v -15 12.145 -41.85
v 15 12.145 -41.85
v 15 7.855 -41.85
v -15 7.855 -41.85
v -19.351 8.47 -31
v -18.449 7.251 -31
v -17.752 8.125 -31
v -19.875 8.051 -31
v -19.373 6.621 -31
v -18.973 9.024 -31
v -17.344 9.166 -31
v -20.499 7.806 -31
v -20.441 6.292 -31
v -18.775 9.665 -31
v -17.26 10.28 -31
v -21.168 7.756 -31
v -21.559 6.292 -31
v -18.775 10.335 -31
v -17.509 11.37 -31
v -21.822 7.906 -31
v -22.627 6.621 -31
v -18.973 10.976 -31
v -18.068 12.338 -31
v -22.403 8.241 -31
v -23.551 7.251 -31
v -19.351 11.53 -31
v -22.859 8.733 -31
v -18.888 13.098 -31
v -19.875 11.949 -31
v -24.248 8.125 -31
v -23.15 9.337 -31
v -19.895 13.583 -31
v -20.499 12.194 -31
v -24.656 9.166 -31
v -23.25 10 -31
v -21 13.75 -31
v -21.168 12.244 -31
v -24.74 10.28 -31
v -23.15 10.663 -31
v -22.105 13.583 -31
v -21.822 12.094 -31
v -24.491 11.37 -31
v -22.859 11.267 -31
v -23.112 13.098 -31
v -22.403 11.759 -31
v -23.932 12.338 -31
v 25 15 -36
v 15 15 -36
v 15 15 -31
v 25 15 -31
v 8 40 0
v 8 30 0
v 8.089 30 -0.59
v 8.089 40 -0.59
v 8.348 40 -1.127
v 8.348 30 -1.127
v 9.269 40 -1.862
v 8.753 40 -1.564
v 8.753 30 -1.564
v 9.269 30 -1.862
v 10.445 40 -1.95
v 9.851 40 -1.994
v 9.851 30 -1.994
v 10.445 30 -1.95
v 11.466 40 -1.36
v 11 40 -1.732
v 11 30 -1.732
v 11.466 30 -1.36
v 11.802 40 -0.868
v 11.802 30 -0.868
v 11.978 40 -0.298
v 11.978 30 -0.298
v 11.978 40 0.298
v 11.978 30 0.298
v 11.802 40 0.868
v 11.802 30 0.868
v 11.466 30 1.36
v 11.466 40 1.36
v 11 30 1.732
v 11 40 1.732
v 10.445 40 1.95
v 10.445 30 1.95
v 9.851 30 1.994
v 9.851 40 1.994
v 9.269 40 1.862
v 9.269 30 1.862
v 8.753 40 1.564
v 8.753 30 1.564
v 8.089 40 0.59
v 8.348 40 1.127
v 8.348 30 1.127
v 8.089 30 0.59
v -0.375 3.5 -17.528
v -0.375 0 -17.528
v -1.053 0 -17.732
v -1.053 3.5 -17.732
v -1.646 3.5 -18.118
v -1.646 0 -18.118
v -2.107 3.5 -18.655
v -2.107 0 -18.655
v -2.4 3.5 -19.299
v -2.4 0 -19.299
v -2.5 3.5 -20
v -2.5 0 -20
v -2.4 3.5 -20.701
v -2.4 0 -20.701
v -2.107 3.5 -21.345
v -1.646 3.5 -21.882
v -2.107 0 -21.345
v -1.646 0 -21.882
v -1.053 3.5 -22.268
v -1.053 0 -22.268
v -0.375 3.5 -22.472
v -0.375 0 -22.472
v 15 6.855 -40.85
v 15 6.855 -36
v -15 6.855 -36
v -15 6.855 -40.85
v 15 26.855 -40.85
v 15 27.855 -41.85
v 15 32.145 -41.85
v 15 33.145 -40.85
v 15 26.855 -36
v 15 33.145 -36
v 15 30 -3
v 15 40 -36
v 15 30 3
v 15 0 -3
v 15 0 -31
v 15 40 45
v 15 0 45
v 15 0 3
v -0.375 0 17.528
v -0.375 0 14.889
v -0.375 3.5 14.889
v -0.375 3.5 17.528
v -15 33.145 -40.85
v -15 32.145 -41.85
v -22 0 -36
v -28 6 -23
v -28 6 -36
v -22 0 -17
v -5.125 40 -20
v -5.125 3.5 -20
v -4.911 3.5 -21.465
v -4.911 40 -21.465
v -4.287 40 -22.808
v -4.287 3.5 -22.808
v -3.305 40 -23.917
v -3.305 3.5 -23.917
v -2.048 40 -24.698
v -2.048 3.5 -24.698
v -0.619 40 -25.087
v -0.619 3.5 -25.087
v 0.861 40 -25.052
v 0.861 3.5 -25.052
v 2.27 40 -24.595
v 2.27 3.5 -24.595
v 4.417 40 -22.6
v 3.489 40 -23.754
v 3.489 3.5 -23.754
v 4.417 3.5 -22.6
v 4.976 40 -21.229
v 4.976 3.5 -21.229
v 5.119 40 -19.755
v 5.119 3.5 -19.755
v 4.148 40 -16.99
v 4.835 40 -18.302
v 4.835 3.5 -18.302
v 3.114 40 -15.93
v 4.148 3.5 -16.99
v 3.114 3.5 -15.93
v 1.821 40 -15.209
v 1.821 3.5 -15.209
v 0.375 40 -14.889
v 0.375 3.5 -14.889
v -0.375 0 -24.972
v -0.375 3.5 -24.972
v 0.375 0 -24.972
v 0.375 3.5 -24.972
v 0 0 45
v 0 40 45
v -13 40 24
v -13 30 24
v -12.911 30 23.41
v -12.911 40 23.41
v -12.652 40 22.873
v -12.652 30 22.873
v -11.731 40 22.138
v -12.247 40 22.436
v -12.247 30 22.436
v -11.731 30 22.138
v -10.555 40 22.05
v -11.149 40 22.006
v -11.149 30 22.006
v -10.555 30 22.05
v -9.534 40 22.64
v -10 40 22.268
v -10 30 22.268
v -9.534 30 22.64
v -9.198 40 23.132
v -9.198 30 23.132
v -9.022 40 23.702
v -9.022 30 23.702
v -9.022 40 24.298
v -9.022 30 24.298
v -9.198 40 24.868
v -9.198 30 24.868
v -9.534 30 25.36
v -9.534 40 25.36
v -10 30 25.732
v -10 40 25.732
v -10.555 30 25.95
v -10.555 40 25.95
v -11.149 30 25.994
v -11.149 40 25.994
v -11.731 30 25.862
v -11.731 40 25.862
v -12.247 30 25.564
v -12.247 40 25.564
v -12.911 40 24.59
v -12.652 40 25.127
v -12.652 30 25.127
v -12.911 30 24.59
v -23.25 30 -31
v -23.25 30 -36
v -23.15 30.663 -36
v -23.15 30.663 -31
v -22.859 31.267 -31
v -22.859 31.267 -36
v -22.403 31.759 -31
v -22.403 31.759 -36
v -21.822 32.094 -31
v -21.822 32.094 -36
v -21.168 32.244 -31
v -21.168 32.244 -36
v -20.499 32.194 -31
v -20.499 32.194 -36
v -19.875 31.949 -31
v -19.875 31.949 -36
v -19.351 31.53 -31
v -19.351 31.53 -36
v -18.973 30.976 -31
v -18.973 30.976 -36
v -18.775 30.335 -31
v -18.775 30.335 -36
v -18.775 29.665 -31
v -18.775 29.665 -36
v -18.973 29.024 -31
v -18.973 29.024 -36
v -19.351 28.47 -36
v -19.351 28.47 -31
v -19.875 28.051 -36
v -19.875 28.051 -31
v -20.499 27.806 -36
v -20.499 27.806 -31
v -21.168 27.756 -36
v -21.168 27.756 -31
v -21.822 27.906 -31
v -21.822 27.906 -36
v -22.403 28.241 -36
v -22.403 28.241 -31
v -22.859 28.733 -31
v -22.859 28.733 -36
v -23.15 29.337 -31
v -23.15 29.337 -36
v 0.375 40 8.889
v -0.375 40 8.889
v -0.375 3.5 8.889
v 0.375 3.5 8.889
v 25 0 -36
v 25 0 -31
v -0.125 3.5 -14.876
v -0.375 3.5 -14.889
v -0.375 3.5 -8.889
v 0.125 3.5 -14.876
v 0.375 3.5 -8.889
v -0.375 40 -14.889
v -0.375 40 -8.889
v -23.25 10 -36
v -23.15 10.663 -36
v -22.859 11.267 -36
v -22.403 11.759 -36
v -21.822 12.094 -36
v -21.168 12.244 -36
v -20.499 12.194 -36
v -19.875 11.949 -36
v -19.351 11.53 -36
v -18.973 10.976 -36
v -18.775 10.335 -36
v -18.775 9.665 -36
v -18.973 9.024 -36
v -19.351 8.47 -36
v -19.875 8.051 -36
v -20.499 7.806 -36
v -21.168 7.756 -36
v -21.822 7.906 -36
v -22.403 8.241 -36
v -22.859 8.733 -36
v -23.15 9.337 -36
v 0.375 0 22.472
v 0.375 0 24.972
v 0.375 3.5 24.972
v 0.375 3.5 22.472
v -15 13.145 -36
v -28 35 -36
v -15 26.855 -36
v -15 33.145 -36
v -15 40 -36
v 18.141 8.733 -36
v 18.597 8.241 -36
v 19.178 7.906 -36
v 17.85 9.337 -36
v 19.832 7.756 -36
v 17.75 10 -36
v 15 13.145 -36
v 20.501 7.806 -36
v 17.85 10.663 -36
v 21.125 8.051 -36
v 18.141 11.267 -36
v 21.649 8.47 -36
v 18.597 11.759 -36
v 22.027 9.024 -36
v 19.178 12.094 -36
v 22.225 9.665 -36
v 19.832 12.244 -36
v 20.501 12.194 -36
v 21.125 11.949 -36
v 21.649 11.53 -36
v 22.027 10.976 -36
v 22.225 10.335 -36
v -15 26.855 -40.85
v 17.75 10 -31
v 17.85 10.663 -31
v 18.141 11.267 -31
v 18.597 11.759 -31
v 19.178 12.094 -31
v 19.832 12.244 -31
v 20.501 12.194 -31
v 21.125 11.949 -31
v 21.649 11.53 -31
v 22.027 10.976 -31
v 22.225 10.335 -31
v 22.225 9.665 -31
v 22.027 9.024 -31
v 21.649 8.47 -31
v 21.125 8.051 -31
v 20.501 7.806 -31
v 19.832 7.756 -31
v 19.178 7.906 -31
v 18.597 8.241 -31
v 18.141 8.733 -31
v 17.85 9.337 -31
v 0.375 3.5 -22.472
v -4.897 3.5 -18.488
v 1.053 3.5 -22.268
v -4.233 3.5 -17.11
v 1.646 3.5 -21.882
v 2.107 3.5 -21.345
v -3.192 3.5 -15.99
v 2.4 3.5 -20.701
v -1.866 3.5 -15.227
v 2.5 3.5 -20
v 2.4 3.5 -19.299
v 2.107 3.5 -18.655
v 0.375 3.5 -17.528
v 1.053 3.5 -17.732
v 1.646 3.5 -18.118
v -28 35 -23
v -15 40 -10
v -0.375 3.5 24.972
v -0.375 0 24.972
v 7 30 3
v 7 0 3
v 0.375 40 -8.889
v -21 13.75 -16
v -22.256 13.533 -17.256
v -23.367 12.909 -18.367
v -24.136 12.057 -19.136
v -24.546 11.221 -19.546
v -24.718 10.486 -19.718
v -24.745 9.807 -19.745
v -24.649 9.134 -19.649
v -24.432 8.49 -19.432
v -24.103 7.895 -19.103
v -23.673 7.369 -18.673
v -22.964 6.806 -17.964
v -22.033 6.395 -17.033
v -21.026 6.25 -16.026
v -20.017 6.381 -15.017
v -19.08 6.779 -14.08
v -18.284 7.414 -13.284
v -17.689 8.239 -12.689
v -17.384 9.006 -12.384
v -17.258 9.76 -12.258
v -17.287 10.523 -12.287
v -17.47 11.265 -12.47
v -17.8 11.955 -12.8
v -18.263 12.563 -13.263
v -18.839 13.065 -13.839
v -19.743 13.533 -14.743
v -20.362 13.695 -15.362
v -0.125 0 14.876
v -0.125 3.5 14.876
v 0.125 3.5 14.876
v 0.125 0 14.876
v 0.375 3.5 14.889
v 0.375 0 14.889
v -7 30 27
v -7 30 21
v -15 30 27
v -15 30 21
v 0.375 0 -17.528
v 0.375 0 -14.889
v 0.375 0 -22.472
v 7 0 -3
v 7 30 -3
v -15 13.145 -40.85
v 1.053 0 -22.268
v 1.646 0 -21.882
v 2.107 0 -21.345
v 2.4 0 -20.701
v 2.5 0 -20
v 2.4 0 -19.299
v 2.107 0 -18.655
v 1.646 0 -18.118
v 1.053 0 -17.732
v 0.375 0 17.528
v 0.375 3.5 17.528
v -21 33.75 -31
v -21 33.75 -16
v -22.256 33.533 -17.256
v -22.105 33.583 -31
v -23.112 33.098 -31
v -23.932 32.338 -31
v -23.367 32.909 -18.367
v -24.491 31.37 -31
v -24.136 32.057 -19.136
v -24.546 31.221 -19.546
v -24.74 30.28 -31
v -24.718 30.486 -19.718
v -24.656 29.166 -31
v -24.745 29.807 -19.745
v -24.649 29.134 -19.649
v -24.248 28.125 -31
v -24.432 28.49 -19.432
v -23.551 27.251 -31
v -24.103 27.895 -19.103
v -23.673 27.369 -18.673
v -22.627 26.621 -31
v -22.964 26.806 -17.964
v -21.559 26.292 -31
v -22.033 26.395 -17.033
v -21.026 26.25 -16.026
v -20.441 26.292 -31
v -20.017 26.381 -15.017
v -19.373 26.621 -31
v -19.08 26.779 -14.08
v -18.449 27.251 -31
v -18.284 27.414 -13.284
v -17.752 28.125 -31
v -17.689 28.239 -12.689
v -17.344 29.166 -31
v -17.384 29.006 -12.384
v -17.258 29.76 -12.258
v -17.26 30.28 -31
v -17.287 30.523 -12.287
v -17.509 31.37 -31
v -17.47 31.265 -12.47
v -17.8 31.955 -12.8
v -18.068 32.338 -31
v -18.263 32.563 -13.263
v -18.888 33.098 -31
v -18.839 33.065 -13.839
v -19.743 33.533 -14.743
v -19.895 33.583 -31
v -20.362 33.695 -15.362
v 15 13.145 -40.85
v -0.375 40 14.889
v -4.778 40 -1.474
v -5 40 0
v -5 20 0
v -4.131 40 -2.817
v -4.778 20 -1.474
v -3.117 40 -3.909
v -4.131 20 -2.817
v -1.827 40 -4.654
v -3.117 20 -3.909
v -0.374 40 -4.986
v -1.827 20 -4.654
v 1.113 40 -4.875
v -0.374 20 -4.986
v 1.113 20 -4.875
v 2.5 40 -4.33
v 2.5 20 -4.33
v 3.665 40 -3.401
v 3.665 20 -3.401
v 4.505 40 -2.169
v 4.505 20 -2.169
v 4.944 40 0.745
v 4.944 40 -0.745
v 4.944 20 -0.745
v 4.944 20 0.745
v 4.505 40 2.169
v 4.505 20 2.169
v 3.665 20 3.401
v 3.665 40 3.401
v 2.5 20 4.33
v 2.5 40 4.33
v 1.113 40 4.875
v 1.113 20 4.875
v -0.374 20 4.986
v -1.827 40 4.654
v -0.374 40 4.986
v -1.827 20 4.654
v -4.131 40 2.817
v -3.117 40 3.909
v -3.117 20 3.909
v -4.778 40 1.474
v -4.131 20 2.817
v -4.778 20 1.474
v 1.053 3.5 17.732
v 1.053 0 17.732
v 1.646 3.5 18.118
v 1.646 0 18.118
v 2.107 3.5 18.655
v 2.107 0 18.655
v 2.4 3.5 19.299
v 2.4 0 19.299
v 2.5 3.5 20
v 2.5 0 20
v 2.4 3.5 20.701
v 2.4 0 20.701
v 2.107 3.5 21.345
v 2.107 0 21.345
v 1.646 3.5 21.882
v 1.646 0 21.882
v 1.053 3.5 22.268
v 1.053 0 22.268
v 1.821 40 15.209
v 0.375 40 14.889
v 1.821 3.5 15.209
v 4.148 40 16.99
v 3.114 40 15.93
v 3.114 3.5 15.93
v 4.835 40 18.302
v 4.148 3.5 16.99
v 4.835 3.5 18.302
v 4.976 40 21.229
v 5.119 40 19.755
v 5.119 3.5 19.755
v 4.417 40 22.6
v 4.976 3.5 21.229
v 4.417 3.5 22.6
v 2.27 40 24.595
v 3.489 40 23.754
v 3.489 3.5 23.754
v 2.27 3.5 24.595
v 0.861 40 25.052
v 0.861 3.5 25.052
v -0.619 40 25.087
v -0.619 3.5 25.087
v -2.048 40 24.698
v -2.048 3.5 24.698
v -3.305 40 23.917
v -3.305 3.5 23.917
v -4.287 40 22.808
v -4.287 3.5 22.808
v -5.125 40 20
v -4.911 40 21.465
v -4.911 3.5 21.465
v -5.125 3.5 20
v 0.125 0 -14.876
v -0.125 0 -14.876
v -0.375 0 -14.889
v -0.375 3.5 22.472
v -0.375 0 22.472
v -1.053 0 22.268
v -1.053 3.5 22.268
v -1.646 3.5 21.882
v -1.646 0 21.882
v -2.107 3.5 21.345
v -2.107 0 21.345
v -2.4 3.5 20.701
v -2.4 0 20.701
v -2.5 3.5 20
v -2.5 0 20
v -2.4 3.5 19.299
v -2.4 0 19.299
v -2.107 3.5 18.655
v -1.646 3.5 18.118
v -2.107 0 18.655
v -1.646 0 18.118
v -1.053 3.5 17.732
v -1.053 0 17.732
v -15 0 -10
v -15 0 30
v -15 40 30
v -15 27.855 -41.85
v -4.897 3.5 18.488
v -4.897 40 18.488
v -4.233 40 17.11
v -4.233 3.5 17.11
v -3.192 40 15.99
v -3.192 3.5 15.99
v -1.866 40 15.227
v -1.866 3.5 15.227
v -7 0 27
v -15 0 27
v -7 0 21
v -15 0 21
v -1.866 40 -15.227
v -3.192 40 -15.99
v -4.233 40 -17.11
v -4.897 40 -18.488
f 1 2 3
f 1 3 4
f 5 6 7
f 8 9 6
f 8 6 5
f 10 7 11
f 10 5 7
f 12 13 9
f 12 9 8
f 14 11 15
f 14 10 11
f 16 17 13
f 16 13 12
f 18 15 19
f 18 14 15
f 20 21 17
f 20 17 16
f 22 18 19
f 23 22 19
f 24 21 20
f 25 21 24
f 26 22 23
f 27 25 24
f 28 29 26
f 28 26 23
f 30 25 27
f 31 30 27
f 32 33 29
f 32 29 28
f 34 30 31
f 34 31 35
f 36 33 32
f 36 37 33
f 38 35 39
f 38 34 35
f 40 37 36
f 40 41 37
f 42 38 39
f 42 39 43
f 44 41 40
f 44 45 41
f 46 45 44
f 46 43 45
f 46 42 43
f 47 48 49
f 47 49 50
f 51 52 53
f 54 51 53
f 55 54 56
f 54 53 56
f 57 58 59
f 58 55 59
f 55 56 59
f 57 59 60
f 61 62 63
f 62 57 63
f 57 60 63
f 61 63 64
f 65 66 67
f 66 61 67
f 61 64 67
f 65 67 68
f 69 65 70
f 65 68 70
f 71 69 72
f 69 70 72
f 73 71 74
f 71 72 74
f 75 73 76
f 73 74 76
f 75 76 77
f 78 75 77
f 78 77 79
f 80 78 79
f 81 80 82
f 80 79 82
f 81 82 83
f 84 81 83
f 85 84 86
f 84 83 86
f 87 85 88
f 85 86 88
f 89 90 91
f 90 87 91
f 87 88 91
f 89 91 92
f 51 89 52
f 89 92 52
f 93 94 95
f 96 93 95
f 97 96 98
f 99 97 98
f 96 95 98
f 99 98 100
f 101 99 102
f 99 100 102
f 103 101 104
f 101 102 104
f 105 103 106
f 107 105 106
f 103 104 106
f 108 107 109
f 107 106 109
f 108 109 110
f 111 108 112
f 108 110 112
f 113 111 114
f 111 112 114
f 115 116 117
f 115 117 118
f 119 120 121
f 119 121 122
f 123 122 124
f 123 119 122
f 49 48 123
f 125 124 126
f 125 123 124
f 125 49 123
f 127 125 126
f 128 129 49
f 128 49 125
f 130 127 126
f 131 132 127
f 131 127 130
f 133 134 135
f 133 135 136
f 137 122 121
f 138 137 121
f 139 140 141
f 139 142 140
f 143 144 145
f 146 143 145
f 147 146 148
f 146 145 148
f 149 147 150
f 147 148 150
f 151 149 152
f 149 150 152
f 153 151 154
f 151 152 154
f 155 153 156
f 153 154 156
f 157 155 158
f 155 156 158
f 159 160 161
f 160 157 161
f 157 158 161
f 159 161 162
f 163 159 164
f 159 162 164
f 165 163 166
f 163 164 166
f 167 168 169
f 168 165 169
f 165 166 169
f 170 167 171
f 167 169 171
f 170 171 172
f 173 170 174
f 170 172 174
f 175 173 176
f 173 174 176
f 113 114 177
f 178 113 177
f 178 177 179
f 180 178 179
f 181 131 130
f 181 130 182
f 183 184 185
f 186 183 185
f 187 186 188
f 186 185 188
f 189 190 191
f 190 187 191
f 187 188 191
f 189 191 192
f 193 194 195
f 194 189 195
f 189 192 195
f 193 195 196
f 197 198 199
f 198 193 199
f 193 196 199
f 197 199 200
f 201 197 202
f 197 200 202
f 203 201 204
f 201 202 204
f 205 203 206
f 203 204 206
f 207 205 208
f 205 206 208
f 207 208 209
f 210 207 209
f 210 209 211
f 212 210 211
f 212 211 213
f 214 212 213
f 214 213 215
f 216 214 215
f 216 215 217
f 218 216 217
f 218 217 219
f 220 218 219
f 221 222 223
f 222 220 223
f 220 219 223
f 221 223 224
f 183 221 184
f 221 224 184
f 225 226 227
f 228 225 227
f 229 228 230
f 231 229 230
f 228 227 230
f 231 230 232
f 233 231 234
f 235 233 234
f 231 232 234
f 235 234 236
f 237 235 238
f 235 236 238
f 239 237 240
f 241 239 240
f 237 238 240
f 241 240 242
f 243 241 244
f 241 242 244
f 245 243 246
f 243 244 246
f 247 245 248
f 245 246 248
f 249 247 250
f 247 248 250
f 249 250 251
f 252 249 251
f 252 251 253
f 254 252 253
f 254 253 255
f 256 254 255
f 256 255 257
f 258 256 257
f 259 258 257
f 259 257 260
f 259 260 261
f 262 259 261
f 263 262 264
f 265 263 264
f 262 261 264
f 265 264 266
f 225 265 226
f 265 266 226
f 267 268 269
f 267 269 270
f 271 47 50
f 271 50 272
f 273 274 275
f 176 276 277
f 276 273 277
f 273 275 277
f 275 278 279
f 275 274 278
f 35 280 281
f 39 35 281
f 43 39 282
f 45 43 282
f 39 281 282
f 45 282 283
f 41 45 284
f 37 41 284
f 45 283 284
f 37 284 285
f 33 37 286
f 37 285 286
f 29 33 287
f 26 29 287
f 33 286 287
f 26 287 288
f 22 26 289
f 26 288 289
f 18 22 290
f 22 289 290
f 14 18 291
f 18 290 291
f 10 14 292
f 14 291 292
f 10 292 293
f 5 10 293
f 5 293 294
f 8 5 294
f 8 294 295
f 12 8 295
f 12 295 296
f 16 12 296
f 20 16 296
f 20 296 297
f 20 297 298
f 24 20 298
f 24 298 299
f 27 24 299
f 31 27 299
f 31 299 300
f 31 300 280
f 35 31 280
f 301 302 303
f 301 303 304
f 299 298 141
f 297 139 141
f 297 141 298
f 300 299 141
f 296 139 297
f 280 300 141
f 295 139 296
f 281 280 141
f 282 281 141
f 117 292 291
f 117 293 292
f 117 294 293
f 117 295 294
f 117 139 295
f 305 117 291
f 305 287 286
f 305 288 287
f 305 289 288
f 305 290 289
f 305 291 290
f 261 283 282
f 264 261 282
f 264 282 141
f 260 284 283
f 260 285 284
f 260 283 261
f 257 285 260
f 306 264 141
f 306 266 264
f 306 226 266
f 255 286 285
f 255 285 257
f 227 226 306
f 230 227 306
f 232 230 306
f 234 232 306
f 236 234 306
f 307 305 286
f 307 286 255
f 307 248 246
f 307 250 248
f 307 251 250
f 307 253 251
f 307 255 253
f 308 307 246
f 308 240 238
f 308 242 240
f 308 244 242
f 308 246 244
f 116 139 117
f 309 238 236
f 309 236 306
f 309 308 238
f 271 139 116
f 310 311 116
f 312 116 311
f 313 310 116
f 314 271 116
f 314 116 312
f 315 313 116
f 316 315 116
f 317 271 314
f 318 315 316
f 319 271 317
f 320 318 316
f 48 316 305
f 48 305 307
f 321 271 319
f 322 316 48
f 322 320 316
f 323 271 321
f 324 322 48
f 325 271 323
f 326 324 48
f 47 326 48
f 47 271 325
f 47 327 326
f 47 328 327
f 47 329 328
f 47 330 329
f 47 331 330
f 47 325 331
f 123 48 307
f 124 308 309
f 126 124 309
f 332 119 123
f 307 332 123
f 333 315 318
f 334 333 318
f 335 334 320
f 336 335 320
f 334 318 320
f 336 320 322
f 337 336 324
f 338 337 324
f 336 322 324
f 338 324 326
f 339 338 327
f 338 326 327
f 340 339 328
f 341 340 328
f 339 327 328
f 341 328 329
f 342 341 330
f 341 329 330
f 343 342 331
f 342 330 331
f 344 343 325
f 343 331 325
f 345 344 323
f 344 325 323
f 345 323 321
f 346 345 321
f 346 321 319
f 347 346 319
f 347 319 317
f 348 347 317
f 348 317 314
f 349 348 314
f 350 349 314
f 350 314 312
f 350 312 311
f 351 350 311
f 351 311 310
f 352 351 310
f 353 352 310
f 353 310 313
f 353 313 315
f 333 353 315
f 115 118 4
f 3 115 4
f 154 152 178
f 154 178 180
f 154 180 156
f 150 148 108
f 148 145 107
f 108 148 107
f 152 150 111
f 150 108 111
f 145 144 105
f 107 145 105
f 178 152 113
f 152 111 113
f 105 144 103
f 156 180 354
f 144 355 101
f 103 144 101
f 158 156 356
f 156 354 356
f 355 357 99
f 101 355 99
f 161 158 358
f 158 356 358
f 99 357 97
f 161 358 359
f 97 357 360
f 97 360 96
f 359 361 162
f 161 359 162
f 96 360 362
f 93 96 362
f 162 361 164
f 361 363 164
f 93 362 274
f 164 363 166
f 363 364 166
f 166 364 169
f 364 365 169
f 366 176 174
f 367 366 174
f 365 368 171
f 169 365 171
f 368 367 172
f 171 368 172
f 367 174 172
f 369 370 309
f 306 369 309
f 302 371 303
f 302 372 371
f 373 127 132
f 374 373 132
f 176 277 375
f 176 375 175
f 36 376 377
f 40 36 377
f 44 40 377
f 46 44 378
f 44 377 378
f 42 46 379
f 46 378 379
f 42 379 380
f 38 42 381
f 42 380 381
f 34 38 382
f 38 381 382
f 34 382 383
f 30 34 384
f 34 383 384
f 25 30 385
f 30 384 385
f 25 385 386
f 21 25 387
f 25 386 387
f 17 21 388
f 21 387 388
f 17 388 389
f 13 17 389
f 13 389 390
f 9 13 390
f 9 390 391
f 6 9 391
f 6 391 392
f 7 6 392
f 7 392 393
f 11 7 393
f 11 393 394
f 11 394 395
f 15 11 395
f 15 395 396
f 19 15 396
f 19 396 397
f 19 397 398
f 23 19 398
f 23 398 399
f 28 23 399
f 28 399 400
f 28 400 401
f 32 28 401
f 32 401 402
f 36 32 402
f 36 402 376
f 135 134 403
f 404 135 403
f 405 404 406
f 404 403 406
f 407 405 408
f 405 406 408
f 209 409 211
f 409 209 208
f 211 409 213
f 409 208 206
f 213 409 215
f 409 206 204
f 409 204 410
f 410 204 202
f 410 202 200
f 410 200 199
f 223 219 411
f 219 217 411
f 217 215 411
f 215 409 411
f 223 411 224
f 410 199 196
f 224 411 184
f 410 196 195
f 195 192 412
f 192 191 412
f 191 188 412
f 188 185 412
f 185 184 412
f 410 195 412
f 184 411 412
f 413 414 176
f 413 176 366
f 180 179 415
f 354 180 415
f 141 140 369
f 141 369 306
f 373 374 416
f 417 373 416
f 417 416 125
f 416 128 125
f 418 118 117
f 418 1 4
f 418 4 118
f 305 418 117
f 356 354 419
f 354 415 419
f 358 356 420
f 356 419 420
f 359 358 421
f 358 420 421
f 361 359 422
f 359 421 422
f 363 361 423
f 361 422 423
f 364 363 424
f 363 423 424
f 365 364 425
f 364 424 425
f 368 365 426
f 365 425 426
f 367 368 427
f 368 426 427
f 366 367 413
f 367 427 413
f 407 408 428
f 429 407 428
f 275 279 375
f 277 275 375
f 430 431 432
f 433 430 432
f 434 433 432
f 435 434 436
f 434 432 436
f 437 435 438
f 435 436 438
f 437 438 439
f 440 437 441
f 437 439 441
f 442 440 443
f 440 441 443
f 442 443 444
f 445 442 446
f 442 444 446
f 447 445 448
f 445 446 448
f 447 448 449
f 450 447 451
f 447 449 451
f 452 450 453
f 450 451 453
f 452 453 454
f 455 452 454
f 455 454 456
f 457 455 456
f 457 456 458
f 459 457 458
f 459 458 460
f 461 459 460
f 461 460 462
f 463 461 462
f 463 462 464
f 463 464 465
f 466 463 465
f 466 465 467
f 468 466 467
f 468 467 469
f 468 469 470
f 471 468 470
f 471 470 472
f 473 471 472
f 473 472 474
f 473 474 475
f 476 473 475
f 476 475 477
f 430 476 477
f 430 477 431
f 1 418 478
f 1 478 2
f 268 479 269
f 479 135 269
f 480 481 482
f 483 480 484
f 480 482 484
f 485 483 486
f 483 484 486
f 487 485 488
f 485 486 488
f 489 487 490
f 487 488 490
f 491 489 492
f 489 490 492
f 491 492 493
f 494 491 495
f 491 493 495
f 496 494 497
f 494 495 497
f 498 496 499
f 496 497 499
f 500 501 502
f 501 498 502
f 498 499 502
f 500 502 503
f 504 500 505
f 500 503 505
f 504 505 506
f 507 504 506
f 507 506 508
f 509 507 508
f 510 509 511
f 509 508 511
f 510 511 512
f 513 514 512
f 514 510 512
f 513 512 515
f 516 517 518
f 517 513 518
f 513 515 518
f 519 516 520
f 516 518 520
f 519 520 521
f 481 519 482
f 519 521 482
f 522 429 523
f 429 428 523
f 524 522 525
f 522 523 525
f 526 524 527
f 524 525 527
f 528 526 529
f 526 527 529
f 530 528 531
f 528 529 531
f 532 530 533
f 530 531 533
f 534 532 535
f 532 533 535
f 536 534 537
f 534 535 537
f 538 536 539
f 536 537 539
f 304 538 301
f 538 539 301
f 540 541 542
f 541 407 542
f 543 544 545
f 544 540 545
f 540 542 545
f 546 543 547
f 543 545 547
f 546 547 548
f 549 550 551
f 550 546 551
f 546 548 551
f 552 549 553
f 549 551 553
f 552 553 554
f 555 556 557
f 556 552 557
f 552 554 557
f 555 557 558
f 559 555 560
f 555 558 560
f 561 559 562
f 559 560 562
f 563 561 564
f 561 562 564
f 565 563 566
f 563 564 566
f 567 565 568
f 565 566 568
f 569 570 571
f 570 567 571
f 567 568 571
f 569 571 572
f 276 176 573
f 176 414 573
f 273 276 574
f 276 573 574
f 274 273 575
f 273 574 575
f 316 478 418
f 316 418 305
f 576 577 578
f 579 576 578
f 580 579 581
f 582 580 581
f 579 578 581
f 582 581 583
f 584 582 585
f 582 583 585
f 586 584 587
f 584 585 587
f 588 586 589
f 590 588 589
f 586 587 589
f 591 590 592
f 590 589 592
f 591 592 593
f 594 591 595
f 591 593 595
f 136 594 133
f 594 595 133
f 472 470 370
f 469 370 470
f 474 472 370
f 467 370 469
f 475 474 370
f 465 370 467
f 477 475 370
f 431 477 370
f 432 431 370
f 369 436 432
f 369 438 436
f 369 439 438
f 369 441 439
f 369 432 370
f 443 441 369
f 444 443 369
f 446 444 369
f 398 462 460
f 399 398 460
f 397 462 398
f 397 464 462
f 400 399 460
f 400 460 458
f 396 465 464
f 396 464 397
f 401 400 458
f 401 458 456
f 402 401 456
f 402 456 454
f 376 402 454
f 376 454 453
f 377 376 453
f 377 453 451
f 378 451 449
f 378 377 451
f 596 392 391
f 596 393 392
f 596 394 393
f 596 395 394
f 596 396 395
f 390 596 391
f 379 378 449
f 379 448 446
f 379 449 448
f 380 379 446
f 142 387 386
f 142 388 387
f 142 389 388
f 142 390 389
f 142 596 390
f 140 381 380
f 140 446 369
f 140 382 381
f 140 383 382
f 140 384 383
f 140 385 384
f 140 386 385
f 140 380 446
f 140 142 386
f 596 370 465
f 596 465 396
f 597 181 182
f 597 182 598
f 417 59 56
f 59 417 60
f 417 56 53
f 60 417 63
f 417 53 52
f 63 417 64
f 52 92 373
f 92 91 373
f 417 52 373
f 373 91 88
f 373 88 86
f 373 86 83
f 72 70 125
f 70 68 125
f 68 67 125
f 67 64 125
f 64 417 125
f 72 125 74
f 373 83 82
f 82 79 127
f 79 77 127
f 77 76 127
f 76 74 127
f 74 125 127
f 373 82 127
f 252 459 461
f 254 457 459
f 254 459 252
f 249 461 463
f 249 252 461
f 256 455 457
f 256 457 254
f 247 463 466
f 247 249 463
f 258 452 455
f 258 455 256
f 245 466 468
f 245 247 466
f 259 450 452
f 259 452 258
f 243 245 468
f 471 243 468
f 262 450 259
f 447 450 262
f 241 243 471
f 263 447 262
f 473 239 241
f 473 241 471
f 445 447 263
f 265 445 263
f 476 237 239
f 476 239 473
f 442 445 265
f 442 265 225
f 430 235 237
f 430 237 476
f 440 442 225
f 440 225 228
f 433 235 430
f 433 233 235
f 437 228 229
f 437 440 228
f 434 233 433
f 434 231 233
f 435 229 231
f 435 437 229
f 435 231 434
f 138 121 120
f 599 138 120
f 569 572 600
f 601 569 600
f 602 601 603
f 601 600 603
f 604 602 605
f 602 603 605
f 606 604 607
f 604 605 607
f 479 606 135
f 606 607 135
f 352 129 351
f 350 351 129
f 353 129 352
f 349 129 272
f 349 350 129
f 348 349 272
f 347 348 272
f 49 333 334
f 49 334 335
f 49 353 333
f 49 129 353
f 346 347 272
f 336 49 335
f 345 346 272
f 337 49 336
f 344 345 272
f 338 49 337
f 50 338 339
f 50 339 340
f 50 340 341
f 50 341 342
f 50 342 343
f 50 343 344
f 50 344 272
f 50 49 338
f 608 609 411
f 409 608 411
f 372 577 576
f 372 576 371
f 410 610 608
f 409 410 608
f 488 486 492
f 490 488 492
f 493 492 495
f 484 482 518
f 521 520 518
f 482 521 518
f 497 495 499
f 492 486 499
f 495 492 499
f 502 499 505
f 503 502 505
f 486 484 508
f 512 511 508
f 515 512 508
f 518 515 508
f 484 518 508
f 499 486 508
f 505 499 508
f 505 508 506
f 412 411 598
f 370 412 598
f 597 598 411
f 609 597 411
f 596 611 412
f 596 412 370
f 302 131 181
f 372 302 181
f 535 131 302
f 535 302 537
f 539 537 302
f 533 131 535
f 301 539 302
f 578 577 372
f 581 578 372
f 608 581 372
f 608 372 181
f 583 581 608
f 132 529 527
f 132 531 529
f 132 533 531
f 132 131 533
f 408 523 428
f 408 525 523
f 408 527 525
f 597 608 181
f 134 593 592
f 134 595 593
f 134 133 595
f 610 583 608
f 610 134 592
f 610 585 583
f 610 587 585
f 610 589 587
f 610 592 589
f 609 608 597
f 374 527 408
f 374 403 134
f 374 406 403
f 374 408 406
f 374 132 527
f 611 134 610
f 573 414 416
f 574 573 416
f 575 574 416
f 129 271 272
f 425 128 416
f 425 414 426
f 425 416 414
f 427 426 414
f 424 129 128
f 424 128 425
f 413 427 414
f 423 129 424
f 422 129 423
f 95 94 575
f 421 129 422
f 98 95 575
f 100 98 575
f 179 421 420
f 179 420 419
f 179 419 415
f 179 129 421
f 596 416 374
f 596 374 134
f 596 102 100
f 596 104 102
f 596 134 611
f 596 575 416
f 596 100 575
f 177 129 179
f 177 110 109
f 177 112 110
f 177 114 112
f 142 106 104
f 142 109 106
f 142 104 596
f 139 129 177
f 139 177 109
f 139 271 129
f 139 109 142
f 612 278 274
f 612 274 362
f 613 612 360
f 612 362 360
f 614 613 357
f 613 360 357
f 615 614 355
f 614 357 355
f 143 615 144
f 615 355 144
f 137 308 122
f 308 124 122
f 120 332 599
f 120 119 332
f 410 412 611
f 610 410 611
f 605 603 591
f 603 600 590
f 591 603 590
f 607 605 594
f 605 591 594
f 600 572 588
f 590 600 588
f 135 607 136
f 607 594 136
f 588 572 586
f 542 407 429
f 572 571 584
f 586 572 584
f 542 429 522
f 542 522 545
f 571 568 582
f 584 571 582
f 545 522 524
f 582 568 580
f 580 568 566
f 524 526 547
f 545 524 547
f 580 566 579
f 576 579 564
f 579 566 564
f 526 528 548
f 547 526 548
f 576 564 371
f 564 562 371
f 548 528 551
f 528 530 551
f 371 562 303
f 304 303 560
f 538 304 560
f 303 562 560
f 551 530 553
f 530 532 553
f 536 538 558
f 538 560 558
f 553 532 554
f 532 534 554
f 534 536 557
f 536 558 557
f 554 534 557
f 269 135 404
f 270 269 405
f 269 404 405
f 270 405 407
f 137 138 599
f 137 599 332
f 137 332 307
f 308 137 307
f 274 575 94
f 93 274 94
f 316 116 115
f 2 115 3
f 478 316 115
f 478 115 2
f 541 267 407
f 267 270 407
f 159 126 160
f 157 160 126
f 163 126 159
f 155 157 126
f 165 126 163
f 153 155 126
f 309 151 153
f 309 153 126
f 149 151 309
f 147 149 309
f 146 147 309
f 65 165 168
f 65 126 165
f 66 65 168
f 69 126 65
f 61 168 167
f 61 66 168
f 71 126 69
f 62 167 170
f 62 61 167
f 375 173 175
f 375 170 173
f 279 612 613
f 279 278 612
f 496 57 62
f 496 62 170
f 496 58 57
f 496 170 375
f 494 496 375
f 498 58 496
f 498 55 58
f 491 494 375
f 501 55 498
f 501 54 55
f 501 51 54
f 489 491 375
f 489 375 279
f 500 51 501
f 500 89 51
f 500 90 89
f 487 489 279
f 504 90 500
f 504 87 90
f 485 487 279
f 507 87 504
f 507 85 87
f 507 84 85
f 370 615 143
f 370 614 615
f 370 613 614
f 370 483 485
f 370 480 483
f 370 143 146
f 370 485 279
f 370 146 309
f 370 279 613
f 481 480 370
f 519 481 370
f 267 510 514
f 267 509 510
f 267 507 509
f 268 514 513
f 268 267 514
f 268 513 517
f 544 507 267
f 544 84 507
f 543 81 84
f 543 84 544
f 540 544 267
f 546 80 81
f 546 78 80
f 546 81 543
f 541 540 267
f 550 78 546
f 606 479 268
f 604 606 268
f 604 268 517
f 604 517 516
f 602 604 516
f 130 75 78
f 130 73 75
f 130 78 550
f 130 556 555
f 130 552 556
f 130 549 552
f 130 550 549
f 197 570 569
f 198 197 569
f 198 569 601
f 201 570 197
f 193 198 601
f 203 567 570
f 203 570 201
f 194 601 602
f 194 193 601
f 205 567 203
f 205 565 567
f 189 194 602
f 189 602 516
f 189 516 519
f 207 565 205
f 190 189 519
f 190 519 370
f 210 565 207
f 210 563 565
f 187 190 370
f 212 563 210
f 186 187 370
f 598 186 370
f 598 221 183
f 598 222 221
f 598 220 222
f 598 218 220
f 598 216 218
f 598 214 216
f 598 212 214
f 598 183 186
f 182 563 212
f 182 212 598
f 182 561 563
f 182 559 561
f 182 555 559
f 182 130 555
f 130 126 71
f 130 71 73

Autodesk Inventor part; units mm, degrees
ref_plane "YZ Plane" through (0, 0, 0) normal (1, 0, 0) x (0, 1, 0)
ref_plane "XZ Plane" through (0, 0, 0) normal (0, 1, 0) x (-1, 0, 0)
sketch "Sketch1" plane through (0, 0, 0) normal (0, 1, 0) x (-1, 0, 0)
  circle A0 centre (0, 0) radius 5
  line L0 (-23.6, 0) -> (36.6, 0) construction
  line L1 (0, -52.2) -> (0, 61.2) construction
  circle A1 centre (0, 20) radius 5.125
  circle A2 centre (0, -20) radius 5.125
  circle A3 centre (-10, 0) radius 2
  circle A4 centre (11, 24) radius 2
  line L2 (0, 45) -> (15, 30)
  line L3 (15, 30) -> (15, -10)
  line L4 (15, -10) -> (28, -23)
  line L5 (28, -23) -> (28, -36)
  line L6 (28, -36) -> (-15, -36)
  line L7 (-15, -36) -> (-15, 45)
  line L8 (-15, 45) -> (0, 45)
  line L9 (0.375, 14.8887) -> (0.375, 8.8887)
  line L10 (0.375, 8.8887) -> (-0.375, 8.8887)
  line L11 (-0.375, 8.8887) -> (-0.375, 14.8887)
  line L12 (0.375, -14.8887) -> (0.375, -8.8887)
  line L13 (0.375, -8.8887) -> (-0.375, -8.8887)
  line L14 (-0.375, -8.8887) -> (-0.375, -14.8887)
  dimension "d0" = 10
  dimension "d1" = 10.25
  dimension "d3" = 40
  dimension "d4" = 4
  dimension "d5" = 11
  dimension "d6" = 4
  dimension "d9" = 10
  dimension "d10" = 4
  dimension "d13" = 45
  dimension "d14" = 15
  dimension "d16" = 16
  dimension "d17" = 13
  dimension "d18" = 45
  dimension "d19" = 25
  dimension "d24" = 0.75
  dimension "d25" = 6
  dimension "d106" = 13
extrude "Extrusion1" add sketch "Sketch1" along normal blind 40
sketch "Sketch2" plane through (0, 0, 0) normal (0, -1, 0) x (1, 0, 0)
  circle A0 centre (0, 0) radius 5 projected
extrude "Extrusion2" add sketch "Sketch2" against normal blind 20
sketch "Sketch3" plane through (0, 0, 0) normal (0, -1, 0) x (1, 0, 0)
  arc A0 (-0.375, -14.8887) -> (0.375, -14.8887) centre (0, -20) ccw projected
  circle A1 centre (0, -20) radius 2.5
  line L0 (-36.6, 0) -> (23.6, 0) construction
  line L1 (0.375, -14.8887) -> (0.375, -8.8887) projected
  line L2 (-0.375, -8.8887) -> (-0.375, -14.8887) projected
  line L3 (0.375, -8.8887) -> (-0.375, -8.8887) projected
  line L4 (-0.375, -14.8887) -> (-0.375, -17.5283)
  line L5 (0.375, -14.8887) -> (0.375, -17.5283)
  line L6 (-0.375, -22.4717) -> (-0.375, -24.9717)
  line L7 (-0.375, -24.9717) -> (0.375, -24.9717)
  line L8 (0.375, -24.9717) -> (0.375, -22.4717)
  arc A2 (0.375, 14.8887) -> (-0.375, 14.8887) centre (0, 20) ccw projected
  line L9 (-0.375, 14.8887) -> (-0.375, 8.8887) projected
  line L10 (0.375, 8.8887) -> (0.375, 14.8887) projected
  line L11 (-0.375, 8.8887) -> (0.375, 8.8887) projected
  circle A3 centre (0, 20) radius 2.5
  line L12 (-0.375, 14.8887) -> (-0.375, 17.5283)
  line L13 (0.375, 14.8887) -> (0.375, 17.5283)
  line L14 (-0.375, 22.4717) -> (-0.375, 24.9717)
  line L15 (-0.375, 24.9717) -> (0.375, 24.9717)
  line L16 (0.375, 24.9717) -> (0.375, 22.4717)
  line L17 (-0.375, -8.8887) -> (-0.375, -14.8887) projected
  arc A4 (0.375, -14.8887) -> (-0.375, -14.8887) centre (0, -20) ccw
  arc A5 (-0.375, 14.8887) -> (0.375, 14.8887) centre (0, 20) ccw
  point P0 (0, 0)
  dimension "d26" = 5
  dimension "d27" = 2.5
  dimension "d30" = 5.125
  dimension "d31" = 5.125
extrude "Extrusion3" add sketch "Sketch3" against normal blind 3.5 contours L4 A1 L6 L7 L8 L5 A0 | L2 L3 L1 A4 | L13 A3 L16 L15 L14 L12 A2 | L10 L11 L9 A5
sketch "Sketch4" plane through (15, 0, 45) normal (1, 0, 0) x (0, 0, -1)
  line L0 (81, 0) -> (81, 40) construction
  line L1 (81, 33.145) -> (85.85, 33.145)
  line L2 (86.85, 32.145) -> (86.85, 27.855)
  line L3 (85.85, 26.855) -> (81, 26.855)
  line L4 (81, 26.855) -> (81, 33.145)
  line L5 (81, 20) -> (108.6331, 20) construction
  line L6 (0, 40) -> (81, 40) construction
  line L7 (85.85, 33.145) -> (86.85, 32.145)
  line L8 (85.85, 26.855) -> (86.85, 27.855)
  line L9 (81, 6.855) -> (85.85, 6.855)
  line L10 (86.85, 7.855) -> (86.85, 12.145)
  line L11 (85.85, 13.145) -> (81, 13.145)
  line L12 (81, 13.145) -> (81, 6.855)
  line L13 (85.85, 6.855) -> (86.85, 7.855)
  line L14 (85.85, 13.145) -> (86.85, 12.145)
  point P0 (45, 0)
  point P1 (86.85, 26.855)
  point P2 (86.85, 33.145)
  point P3 (86.85, 13.145)
  point P4 (86.85, 6.855)
  dimension "d32" = 6.855
  dimension "d33" = 5.85
  dimension "d34" = 6.29
  dimension "d35" = 1
  dimension "d36" = 1
  dimension "d37" = 1
  dimension "d38" = 1
extrude "Extrusion4" add sketch "Sketch4" against normal up to surface (43 mm away)
sketch "Sketch5" plane through (15, 27.855, -41.85) normal (0, 0, -1) x (-1, 0, 0)
  line L0 (30, -27.855) -> (30, 12.145) construction
  line L1 (0, 5.29) -> (43, 5.29) projected
  line L2 (36, 5.29) -> (36, -1) construction
  line L3 (43, -1) -> (0, -1) projected
  circle A0 centre (36, 2.145) radius 2.25
  line L4 (0, -27.855) -> (0, 12.145) projected
  line L5 (0, -7.855) -> (43, -7.855) construction
  line L6 (43, -27.855) -> (43, 12.145) projected
  circle A1 centre (36, -17.855) radius 2.25
  point P0 (15, -27.855)
  dimension "d41" = 4.5
  dimension "d42" = 6
extrude "Extrusion5" cut sketch "Sketch5" against normal through all contours A0 | A1
ref_plane "Work Plane1" through (-15, 0, -10) normal (0, 0, 1) x (0, 1, 0)
sketch "Sketch6" plane through (-15, 0, -10) normal (0, 0, 1) x (0, 1, 0)
  circle A0 centre (30, 6) radius 2.25 projected
  circle A1 centre (30, 6) radius 3.75
  circle A2 centre (10, 6) radius 2.25 projected
  circle A3 centre (10, 6) radius 3.75
  point P0 (0, -15)
  dimension "d46" = 7.5
  dimension "d47" = 7.5
extrude "Extrusion6" cut sketch "Sketch6" against normal blind 21 contours A0 | A1 | A2 | A3
sketch "Sketch7" plane through (15, 27.855, -41.85) normal (0, 0, -1) x (-1, 0, 0)
  line L0 (0, -27.855) -> (0, 12.145) projected
  line L1 (0, -7.855) -> (43, -7.855) construction
  line L2 (43, -27.855) -> (43, 12.145) projected
  line L3 (0, -15.71) -> (0, -20)
  line L4 (0, -12.855) -> (-10, -12.855)
  line L5 (-10, -12.855) -> (-10, -27.855)
  line L6 (-10, -27.855) -> (0, -27.855)
  line L7 (0, -27.855) -> (0, -12.855)
  line L8 (15, -27.855) -> (0, -27.855) projected
  point P0 (0, 0)
  point P1 (0, 4.29)
  point P2 (0, -17.855)
  point P3 (0, -12.855)
  point P4 (-10, -20.355)
  dimension "d63" = 10
  dimension "d64" = 5
extrude "Extrusion7" add sketch "Sketch7" against normal up to surface (86.85 mm away)
sketch "Sketch9" plane through (-28, 27.855, -41.85) normal (0, 0, -1) x (-1, 0, 0)
  arc A0 (-6.3207, 0) -> (-6.3207, 4.29) centre (-7, 2.145) ccw projected
  line L0 (-43, -6.9275) -> (0, -7.855) construction
  line L1 (0, -14.71) -> (0, -1) projected
  circle A1 centre (-48, -17.855) radius 2.25
  line L2 (-43, -12.855) -> (-53, -12.855) projected
  arc A2 (-7.6793, -15.71) -> (-7.6793, -20) centre (-7, -17.855) ccw projected
  line L3 (-7, -17.855) -> (-48, -17.855) construction
  line L4 (-48, -12.855) -> (-48, -17.855) construction
  point P0 (-28, -27.855)
extrude "Extrusion9" cut sketch "Sketch9" against normal through all
sketch "Sketch10" plane through (0, 0, 45) normal (0, 0, 1) x (1, 0, 0)
  circle A0 centre (20, 10) radius 2.25 projected
  circle A1 centre (20, 10) radius 3.5
  point P0 (0, 0)
  dimension "d59" = 7
extrude "Extrusion10" cut sketch "Sketch10" against normal blind 70 contours A0 | A1
sketch "Sketch11" plane through (25, 0, -41.85) normal (1, 0, 0) x (0, 0, -1)
  line L0 (-1, 13.145) -> (-5.85, 13.145) projected
  line L1 (-5.85, 13.145) -> (-5.85, 15) projected
  line L2 (0, 15) -> (-5.85, 15) projected
  line L3 (0, 12.145) -> (0, 15) projected
  line L4 (0, 12.145) -> (-1, 13.145) projected
  line L5 (-5.85, 13.145) -> (-5.85, 6.855) projected
  line L6 (0, 0) -> (0, 7.855) projected
  line L7 (-1, 6.855) -> (0, 7.855) projected
  line L8 (-5.85, 6.855) -> (-1, 6.855) projected
  line L9 (-5.85, 0) -> (-5.85, 6.855) projected
  line L10 (-5.85, 6.855) -> (-5.85, 0)
  line L11 (0, 0) -> (-86.85, 0) projected
  line L12 (-5.85, 0) -> (0, 0)
  point P0 (-41.85, 0)
extrude "Extrusion11" cut sketch "Sketch11" against normal through all
sketch "Sketch12" plane through (15, 27.855, -41.85) normal (1, 0, 0) x (0, 0, -1)
  line L0 (-43.85, 12.145) -> (-39.85, 12.145) projected
  line L1 (-44.85, -27.855) -> (-38.85, -27.855)
  line L2 (-38.85, -27.855) -> (-38.85, 2.145)
  line L3 (-38.85, 2.145) -> (-44.85, 2.145)
  line L4 (-44.85, 2.145) -> (-44.85, -27.855)
  line L5 (-41.85, 12.145) -> (-41.85, 2.145)
  line L6 (-31.85, -27.855) -> (-71.85, -27.855) projected
  point P0 (-41.85, -27.855)
  dimension "d72" = 10
  dimension "d74" = 6
extrude "Extrusion12" cut sketch "Sketch12" against normal blind 8
sketch "Sketch13" plane through (-15, 10, -10) normal (-1, 0, 0) x (0, 0, 1)
  line L0 (32, 30) -> (36, 30) projected
  line L1 (34, 30) -> (34, 20)
  line L2 (31, -10) -> (37, -10)
  line L3 (37, -10) -> (37, 20)
  line L4 (37, 20) -> (31, 20)
  line L5 (31, 20) -> (31, -10)
  line L6 (0, -10) -> (40, -10) projected
  dimension "d79" = 6
  dimension "d110" = 10
extrude "Extrusion13" cut sketch "Sketch13" against normal blind 8
chamfer "Chamfer2" distance 13 distance2 5 1 edges at (-28, 40, -29.5) measured on face at (-4.5425, 40, -32.3621)
chamfer "Chamfer3" distance 6 angle 45 1 edges at (-28, 0, -29.5)
sketch "Sketch18" plane through (15, 15, -36) normal (0, 1, 0) x (1, 0, 0)
  line L0 (-37, -19) -> (-43, -13) construction
  line L1 (10, 0) -> (10, -81) projected
  line L2 (0, -81) -> (0, 0) projected
  line L3 (10, 0) -> (0, 0)
  line L4 (0, 0) -> (0, -5)
  line L5 (0, -5) -> (10, -5)
  line L6 (10, -5) -> (10, 0)
  line L7 (10, 0) -> (10, -81) projected
  line L8 (10, -81) -> (0, -81)
  line L9 (8.5, -81) -> (1.5, -81) projected
  point P0 (-15, -36)
  point P1 (10, -5)
  dimension "d109" = 5
extrude "Extrusion18" cut sketch "Sketch18" against normal through all contours L1 L8 L2 L5
sketch "Sketch20" plane through (0, 40, 0) normal (0, 1, 0) x (1, 0, 0)
  line L0 (17.75, 41.85) -> (22.25, 41.85) projected
  line L1 (-20.3207, 41.85) -> (-18.75, 41.85) projected
  line L2 (25, 36) -> (15, 36)
  line L3 (15, 36) -> (15, 41.85)
  line L4 (15, 41.85) -> (25, 41.85)
  line L5 (25, 41.85) -> (25, 36)
  line L6 (25, 40.85) -> (25, 36) projected
  line L7 (25, 36) -> (15, 36) projected
  line L8 (25, 41.85) -> (-28, 41.85) construction
  line L9 (15, 40.85) -> (15, 36) projected
  line L10 (-28, 41.85) -> (-15, 41.85)
  line L11 (-15, 41.85) -> (-15, 36)
  line L12 (-15, 36) -> (-28, 36)
  line L13 (-28, 36) -> (-28, 41.85)
  line L14 (-15, 36) -> (-28, 36) projected
  line L15 (-28, 40.85) -> (-28, 36) projected
  line L16 (15, 41.85) -> (-28, 41.85) construction
  line L17 (-15, 10) -> (-15, 36) projected
  point P0 (0, 0)
extrude "Extrusion19" cut sketch "Sketch20" against normal through all
equation "\"d30\" = d31"
equation "\"d36\" = d35"
equation "\"d37\" = d35"
equation "\"d38\" = d37"
equation "\"d47\" = d46"
equation "\"d79\" = d74"
properties part number "_3DPrint"
